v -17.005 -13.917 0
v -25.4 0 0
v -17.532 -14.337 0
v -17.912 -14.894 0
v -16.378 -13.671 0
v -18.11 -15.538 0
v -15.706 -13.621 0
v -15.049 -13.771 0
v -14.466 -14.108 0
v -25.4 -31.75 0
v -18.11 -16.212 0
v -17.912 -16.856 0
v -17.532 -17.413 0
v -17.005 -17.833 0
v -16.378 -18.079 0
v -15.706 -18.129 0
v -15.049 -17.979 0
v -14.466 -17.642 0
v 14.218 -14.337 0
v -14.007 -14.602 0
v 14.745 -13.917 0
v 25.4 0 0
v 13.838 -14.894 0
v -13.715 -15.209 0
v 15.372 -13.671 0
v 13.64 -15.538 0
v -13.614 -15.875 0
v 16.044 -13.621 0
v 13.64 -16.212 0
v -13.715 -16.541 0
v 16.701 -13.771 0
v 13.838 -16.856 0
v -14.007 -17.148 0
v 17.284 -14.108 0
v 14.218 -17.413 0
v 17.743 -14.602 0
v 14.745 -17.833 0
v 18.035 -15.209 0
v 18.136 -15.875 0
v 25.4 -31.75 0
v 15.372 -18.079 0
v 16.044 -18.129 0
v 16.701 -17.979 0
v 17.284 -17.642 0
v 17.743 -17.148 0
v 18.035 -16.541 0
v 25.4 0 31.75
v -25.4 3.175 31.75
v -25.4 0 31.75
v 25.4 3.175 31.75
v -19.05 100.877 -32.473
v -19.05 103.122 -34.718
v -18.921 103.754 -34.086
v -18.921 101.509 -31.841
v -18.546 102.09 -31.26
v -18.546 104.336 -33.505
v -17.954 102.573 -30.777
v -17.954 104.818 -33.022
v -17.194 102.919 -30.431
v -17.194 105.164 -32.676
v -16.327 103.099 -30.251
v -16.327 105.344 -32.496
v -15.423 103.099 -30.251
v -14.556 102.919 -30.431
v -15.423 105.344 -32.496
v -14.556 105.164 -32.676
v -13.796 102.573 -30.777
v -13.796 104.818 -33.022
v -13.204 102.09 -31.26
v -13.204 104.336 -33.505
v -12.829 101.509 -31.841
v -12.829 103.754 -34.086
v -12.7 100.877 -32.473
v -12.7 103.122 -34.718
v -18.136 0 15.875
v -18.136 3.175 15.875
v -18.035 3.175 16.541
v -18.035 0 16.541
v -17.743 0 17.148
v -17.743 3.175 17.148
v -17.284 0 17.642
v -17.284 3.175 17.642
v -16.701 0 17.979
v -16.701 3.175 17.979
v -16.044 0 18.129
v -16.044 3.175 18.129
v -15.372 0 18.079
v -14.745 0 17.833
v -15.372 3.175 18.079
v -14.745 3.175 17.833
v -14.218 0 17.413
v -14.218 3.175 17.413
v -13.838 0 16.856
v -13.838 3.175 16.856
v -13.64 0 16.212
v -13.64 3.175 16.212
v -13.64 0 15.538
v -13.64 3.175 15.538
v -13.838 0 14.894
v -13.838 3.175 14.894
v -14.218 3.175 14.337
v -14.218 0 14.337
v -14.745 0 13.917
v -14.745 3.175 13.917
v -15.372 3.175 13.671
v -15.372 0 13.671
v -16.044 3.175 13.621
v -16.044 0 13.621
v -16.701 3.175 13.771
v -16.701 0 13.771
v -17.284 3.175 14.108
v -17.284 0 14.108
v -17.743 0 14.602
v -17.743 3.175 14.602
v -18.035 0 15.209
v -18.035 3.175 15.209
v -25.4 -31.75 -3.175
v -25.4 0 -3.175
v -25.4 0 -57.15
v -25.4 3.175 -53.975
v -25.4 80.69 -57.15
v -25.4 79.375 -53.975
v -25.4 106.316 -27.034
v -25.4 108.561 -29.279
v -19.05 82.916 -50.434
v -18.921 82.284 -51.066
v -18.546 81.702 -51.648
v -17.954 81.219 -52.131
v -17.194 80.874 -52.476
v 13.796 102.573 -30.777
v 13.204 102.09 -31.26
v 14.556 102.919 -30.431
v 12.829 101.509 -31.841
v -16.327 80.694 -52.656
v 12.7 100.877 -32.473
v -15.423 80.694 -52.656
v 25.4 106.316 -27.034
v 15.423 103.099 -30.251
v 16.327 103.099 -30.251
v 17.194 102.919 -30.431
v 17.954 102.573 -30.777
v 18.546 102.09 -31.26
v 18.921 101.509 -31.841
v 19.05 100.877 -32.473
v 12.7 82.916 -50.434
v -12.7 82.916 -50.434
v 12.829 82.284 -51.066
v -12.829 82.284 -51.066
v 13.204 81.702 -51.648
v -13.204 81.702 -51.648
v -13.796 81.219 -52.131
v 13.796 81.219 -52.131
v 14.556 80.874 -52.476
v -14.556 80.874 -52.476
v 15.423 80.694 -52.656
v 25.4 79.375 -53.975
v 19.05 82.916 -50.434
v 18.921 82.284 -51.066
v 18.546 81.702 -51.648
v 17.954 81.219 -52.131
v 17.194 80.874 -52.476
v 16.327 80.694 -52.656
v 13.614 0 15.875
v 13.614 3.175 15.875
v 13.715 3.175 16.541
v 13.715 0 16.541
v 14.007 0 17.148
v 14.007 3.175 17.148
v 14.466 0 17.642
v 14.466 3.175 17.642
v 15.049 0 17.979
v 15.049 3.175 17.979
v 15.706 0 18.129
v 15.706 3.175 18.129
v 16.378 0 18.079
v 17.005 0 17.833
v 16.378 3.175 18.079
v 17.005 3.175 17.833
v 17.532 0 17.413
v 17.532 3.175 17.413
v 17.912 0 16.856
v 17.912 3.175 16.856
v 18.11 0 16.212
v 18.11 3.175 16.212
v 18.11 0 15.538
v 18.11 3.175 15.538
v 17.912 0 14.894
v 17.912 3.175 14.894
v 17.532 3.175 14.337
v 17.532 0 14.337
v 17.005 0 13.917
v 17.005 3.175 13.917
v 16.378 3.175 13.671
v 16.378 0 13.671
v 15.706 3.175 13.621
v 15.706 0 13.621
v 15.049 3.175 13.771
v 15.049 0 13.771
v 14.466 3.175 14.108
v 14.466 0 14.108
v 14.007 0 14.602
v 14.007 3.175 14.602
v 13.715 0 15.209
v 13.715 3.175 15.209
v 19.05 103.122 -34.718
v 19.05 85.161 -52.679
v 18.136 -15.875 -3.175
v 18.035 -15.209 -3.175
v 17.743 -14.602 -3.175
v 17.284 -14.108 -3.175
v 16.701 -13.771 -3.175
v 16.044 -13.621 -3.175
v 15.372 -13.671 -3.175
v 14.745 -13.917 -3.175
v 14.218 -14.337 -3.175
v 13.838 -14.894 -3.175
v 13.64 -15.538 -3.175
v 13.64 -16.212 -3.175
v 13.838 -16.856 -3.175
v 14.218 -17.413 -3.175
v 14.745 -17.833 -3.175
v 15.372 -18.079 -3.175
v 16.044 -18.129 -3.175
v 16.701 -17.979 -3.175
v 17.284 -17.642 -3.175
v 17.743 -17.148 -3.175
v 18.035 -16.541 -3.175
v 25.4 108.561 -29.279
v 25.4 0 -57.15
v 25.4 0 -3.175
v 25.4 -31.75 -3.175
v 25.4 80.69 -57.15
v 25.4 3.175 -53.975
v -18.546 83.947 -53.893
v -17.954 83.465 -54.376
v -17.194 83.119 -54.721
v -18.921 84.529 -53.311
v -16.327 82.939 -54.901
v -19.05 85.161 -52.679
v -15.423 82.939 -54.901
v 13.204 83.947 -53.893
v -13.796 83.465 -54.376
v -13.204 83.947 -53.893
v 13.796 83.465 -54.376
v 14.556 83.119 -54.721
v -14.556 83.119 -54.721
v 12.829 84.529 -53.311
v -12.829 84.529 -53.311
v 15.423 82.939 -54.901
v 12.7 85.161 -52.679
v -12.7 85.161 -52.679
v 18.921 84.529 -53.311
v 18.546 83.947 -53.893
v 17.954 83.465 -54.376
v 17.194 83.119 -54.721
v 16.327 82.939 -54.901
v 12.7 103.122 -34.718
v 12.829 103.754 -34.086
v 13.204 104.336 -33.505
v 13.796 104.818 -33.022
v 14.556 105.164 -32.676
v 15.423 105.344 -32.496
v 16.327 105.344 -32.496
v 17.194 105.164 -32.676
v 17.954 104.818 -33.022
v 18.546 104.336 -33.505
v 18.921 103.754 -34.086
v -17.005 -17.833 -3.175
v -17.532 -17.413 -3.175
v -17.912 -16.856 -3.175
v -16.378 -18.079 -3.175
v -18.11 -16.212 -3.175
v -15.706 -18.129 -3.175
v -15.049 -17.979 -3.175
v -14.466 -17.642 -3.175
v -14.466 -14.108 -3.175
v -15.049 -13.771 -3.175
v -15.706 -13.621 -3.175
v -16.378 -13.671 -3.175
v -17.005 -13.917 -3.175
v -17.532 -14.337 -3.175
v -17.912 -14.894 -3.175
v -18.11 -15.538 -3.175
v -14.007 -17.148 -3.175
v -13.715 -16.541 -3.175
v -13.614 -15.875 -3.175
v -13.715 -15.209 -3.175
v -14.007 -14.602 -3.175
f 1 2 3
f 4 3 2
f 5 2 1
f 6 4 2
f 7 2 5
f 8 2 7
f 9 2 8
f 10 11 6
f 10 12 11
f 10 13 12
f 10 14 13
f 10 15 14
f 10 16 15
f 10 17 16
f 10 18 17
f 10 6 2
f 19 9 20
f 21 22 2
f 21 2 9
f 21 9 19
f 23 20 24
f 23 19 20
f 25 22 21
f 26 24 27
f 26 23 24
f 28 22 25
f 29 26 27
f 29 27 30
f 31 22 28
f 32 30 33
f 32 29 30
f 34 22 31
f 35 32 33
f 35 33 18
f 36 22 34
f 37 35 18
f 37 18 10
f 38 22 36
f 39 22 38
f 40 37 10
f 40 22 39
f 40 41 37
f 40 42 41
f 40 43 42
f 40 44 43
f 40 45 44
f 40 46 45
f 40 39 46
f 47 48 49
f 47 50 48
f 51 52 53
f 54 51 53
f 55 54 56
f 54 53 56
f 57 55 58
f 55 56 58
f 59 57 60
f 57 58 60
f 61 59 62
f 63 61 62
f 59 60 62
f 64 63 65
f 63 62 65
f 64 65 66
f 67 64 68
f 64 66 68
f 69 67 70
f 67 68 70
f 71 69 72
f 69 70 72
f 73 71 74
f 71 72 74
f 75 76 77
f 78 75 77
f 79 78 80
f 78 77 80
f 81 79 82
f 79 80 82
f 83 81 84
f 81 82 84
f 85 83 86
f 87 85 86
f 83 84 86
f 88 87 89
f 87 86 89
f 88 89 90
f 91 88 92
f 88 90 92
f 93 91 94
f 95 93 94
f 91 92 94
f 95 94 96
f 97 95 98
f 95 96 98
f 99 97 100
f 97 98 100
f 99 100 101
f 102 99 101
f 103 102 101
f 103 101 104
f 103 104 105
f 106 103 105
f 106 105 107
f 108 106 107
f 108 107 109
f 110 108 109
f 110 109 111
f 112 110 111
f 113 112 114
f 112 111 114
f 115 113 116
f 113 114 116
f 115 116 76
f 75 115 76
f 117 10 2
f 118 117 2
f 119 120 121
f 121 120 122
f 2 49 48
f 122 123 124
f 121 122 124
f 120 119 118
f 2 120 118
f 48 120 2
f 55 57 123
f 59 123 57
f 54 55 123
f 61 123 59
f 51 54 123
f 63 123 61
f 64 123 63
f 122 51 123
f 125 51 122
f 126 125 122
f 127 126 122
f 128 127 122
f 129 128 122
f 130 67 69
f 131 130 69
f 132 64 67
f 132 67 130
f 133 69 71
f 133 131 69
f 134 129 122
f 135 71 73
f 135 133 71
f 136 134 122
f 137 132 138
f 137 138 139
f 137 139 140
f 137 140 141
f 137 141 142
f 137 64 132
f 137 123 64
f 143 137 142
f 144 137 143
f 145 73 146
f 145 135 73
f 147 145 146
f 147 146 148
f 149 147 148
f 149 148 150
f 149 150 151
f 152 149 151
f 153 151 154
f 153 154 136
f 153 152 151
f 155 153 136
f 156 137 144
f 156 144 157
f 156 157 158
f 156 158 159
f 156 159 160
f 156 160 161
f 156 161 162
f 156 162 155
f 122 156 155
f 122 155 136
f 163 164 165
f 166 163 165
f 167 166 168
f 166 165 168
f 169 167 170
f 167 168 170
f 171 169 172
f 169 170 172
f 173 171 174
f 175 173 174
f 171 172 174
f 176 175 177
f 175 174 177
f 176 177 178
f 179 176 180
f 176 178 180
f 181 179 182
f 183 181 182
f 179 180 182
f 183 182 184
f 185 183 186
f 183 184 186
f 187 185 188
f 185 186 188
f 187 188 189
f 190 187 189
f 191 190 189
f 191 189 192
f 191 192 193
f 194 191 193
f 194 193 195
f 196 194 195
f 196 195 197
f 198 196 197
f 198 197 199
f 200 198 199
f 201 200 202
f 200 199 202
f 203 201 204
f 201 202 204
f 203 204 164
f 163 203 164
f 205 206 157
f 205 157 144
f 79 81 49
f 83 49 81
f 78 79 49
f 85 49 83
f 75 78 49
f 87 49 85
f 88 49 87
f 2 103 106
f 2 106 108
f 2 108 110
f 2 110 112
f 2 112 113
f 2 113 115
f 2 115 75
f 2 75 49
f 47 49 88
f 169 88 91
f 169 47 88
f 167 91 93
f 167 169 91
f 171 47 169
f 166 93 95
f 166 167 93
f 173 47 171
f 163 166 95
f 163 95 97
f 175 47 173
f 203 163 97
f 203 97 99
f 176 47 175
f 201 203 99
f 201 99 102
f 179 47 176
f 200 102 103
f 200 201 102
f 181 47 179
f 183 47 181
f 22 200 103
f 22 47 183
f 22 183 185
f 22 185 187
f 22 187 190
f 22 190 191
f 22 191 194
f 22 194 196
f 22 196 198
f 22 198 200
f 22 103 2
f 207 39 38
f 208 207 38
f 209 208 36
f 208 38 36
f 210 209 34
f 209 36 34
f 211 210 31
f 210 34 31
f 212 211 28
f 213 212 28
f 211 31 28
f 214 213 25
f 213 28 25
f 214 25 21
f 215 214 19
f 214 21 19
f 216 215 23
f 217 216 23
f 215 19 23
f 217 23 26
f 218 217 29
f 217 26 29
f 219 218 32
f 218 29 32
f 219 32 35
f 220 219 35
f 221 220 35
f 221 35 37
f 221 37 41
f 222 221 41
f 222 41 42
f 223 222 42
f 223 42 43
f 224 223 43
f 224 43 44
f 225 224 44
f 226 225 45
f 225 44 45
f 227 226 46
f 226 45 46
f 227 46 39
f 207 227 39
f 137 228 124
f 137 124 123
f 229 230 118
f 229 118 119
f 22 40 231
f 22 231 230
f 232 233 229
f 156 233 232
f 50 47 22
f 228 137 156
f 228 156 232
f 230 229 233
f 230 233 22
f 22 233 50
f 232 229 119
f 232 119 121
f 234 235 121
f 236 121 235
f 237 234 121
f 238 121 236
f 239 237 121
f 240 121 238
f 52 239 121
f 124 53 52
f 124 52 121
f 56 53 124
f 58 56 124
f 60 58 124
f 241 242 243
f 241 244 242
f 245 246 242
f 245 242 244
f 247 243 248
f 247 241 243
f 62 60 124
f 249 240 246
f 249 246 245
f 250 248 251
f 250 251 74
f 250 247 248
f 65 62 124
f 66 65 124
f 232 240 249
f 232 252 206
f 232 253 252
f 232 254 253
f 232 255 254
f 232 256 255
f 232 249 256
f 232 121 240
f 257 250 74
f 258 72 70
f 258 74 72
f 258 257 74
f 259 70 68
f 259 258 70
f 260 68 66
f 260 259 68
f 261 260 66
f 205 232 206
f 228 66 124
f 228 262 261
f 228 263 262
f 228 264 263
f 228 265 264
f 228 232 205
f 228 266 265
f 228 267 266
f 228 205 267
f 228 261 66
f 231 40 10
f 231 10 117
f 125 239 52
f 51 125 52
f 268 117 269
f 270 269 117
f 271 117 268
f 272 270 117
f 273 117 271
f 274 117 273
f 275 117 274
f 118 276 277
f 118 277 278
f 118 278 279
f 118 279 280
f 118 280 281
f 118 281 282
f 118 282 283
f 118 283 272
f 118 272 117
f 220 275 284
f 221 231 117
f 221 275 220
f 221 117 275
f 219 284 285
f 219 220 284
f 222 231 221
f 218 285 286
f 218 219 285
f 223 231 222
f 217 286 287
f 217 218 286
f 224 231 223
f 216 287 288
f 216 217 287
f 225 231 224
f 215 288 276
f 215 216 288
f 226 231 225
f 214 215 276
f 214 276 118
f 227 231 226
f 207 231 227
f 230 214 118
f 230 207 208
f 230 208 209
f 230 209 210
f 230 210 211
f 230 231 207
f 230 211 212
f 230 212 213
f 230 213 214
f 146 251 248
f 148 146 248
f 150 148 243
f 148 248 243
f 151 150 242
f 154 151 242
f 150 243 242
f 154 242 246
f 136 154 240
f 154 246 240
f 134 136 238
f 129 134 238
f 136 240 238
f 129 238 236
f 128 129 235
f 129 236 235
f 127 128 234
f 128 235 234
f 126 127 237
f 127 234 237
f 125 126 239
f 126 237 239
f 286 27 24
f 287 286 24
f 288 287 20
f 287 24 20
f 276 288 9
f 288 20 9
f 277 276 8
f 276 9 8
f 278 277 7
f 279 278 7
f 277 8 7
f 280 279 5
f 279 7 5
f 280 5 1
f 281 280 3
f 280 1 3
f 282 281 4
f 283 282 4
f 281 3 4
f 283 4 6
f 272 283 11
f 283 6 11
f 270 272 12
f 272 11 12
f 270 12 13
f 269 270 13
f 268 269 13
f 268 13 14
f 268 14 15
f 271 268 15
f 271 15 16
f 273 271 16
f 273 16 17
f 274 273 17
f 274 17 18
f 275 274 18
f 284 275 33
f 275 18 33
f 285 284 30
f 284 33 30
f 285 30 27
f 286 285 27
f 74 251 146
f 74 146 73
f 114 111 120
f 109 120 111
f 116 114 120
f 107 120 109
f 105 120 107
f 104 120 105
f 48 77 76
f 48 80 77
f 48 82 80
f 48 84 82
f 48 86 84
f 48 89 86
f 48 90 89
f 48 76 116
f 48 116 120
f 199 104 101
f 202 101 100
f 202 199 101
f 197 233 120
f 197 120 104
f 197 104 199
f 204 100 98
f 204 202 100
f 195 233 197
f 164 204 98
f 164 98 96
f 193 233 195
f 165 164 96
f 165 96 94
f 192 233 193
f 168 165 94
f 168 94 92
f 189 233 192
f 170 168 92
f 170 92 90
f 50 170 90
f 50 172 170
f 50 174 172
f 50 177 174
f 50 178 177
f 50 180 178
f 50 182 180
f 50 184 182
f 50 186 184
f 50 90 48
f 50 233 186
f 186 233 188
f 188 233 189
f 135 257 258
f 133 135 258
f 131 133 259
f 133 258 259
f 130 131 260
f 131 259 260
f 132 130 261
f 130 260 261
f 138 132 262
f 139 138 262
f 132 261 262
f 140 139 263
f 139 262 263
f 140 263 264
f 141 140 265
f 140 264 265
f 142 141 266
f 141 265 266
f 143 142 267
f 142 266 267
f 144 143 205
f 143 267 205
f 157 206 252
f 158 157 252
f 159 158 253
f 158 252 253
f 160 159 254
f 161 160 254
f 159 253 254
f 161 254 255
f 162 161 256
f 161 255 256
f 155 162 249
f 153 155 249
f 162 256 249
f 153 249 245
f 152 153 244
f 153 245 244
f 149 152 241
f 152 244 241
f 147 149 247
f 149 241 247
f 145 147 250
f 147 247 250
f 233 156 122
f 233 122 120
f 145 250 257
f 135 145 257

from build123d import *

# Parameters (mm, degrees)
F1_DEPTH = 25.4
F2_R     = 2.2606
F3_DEPTH = 3.175
F4_R     = 2.2606
F5_DEPTH = 3.175
F6_W     = 6.35
F6_H     = 25.4
F7_DEPTH = 3.175


with BuildPart() as f1:
    # F0 (on Right) → F1 (new body, symmetric)
    with BuildSketch(Plane.YZ):
        Polygon((0, 31.75), (0, 0), (-31.75, 0), (-31.75, -3.175), (0, -3.175), (0, -57.15), (80.690128, -57.15), (108.560832, -29.279296), (106.315768, -27.034232), (79.375, -53.975), (3.175, -53.975), (3.175, 31.75), align=None)
    extrude(amount=F1_DEPTH, both=True)

    # F2 (on face) → F3 (cut, through all)
    with BuildSketch(Plane(origin=(0, 3.175, 0), x_dir=(-1, 0, 0), z_dir=(0, 1, 0))):
        with Locations((15.875, 15.875)):
            Circle(F2_R)
        with Locations((-15.875, 15.875)):
            Circle(F2_R)
    extrude(amount=-F3_DEPTH, mode=Mode.SUBTRACT)

    # F4 (on face) → F5 (cut, through all)
    with BuildSketch(Plane.XY):
        with Locations((15.875, -15.875)):
            Circle(F4_R)
        with Locations((-15.875, -15.875)):
            Circle(F4_R)
    extrude(amount=-F5_DEPTH, mode=Mode.SUBTRACT)

    # F6 (on face) → F7 (cut, through all)
    with BuildSketch(Plane(origin=(0, 68.920064, -68.920064), x_dir=(-1, 0, 0), z_dir=(0, 0.707107, -0.707107))):
        with BuildLine():
            ThreePointArc((-12.7, 48.368529), (-15.875, 51.543529), (-19.05, 48.368529))
            Line((-19.05, 48.368529), (-12.7, 48.368529))
        make_face()
        with Locations((-15.875, 35.668529)):
            Rectangle(F6_W, F6_H)
        with BuildLine():
            Line((-12.7, 22.968529), (-19.05, 22.968529))
            ThreePointArc((-19.05, 22.968529), (-15.875, 19.793529), (-12.7, 22.968529))
        make_face()
        with BuildLine():
            ThreePointArc((19.05, 48.368529), (15.875, 51.543529), (12.7, 48.368529))
            Line((12.7, 48.368529), (19.05, 48.368529))
        make_face()
        with Locations((15.875, 35.668529)):
            Rectangle(F6_W, F6_H)
        with BuildLine():
            Line((19.05, 22.968529), (12.7, 22.968529))
            ThreePointArc((12.7, 22.968529), (15.875, 19.793529), (19.05, 22.968529))
        make_face()
    extrude(amount=-F7_DEPTH, mode=Mode.SUBTRACT)


solid = f1.part
